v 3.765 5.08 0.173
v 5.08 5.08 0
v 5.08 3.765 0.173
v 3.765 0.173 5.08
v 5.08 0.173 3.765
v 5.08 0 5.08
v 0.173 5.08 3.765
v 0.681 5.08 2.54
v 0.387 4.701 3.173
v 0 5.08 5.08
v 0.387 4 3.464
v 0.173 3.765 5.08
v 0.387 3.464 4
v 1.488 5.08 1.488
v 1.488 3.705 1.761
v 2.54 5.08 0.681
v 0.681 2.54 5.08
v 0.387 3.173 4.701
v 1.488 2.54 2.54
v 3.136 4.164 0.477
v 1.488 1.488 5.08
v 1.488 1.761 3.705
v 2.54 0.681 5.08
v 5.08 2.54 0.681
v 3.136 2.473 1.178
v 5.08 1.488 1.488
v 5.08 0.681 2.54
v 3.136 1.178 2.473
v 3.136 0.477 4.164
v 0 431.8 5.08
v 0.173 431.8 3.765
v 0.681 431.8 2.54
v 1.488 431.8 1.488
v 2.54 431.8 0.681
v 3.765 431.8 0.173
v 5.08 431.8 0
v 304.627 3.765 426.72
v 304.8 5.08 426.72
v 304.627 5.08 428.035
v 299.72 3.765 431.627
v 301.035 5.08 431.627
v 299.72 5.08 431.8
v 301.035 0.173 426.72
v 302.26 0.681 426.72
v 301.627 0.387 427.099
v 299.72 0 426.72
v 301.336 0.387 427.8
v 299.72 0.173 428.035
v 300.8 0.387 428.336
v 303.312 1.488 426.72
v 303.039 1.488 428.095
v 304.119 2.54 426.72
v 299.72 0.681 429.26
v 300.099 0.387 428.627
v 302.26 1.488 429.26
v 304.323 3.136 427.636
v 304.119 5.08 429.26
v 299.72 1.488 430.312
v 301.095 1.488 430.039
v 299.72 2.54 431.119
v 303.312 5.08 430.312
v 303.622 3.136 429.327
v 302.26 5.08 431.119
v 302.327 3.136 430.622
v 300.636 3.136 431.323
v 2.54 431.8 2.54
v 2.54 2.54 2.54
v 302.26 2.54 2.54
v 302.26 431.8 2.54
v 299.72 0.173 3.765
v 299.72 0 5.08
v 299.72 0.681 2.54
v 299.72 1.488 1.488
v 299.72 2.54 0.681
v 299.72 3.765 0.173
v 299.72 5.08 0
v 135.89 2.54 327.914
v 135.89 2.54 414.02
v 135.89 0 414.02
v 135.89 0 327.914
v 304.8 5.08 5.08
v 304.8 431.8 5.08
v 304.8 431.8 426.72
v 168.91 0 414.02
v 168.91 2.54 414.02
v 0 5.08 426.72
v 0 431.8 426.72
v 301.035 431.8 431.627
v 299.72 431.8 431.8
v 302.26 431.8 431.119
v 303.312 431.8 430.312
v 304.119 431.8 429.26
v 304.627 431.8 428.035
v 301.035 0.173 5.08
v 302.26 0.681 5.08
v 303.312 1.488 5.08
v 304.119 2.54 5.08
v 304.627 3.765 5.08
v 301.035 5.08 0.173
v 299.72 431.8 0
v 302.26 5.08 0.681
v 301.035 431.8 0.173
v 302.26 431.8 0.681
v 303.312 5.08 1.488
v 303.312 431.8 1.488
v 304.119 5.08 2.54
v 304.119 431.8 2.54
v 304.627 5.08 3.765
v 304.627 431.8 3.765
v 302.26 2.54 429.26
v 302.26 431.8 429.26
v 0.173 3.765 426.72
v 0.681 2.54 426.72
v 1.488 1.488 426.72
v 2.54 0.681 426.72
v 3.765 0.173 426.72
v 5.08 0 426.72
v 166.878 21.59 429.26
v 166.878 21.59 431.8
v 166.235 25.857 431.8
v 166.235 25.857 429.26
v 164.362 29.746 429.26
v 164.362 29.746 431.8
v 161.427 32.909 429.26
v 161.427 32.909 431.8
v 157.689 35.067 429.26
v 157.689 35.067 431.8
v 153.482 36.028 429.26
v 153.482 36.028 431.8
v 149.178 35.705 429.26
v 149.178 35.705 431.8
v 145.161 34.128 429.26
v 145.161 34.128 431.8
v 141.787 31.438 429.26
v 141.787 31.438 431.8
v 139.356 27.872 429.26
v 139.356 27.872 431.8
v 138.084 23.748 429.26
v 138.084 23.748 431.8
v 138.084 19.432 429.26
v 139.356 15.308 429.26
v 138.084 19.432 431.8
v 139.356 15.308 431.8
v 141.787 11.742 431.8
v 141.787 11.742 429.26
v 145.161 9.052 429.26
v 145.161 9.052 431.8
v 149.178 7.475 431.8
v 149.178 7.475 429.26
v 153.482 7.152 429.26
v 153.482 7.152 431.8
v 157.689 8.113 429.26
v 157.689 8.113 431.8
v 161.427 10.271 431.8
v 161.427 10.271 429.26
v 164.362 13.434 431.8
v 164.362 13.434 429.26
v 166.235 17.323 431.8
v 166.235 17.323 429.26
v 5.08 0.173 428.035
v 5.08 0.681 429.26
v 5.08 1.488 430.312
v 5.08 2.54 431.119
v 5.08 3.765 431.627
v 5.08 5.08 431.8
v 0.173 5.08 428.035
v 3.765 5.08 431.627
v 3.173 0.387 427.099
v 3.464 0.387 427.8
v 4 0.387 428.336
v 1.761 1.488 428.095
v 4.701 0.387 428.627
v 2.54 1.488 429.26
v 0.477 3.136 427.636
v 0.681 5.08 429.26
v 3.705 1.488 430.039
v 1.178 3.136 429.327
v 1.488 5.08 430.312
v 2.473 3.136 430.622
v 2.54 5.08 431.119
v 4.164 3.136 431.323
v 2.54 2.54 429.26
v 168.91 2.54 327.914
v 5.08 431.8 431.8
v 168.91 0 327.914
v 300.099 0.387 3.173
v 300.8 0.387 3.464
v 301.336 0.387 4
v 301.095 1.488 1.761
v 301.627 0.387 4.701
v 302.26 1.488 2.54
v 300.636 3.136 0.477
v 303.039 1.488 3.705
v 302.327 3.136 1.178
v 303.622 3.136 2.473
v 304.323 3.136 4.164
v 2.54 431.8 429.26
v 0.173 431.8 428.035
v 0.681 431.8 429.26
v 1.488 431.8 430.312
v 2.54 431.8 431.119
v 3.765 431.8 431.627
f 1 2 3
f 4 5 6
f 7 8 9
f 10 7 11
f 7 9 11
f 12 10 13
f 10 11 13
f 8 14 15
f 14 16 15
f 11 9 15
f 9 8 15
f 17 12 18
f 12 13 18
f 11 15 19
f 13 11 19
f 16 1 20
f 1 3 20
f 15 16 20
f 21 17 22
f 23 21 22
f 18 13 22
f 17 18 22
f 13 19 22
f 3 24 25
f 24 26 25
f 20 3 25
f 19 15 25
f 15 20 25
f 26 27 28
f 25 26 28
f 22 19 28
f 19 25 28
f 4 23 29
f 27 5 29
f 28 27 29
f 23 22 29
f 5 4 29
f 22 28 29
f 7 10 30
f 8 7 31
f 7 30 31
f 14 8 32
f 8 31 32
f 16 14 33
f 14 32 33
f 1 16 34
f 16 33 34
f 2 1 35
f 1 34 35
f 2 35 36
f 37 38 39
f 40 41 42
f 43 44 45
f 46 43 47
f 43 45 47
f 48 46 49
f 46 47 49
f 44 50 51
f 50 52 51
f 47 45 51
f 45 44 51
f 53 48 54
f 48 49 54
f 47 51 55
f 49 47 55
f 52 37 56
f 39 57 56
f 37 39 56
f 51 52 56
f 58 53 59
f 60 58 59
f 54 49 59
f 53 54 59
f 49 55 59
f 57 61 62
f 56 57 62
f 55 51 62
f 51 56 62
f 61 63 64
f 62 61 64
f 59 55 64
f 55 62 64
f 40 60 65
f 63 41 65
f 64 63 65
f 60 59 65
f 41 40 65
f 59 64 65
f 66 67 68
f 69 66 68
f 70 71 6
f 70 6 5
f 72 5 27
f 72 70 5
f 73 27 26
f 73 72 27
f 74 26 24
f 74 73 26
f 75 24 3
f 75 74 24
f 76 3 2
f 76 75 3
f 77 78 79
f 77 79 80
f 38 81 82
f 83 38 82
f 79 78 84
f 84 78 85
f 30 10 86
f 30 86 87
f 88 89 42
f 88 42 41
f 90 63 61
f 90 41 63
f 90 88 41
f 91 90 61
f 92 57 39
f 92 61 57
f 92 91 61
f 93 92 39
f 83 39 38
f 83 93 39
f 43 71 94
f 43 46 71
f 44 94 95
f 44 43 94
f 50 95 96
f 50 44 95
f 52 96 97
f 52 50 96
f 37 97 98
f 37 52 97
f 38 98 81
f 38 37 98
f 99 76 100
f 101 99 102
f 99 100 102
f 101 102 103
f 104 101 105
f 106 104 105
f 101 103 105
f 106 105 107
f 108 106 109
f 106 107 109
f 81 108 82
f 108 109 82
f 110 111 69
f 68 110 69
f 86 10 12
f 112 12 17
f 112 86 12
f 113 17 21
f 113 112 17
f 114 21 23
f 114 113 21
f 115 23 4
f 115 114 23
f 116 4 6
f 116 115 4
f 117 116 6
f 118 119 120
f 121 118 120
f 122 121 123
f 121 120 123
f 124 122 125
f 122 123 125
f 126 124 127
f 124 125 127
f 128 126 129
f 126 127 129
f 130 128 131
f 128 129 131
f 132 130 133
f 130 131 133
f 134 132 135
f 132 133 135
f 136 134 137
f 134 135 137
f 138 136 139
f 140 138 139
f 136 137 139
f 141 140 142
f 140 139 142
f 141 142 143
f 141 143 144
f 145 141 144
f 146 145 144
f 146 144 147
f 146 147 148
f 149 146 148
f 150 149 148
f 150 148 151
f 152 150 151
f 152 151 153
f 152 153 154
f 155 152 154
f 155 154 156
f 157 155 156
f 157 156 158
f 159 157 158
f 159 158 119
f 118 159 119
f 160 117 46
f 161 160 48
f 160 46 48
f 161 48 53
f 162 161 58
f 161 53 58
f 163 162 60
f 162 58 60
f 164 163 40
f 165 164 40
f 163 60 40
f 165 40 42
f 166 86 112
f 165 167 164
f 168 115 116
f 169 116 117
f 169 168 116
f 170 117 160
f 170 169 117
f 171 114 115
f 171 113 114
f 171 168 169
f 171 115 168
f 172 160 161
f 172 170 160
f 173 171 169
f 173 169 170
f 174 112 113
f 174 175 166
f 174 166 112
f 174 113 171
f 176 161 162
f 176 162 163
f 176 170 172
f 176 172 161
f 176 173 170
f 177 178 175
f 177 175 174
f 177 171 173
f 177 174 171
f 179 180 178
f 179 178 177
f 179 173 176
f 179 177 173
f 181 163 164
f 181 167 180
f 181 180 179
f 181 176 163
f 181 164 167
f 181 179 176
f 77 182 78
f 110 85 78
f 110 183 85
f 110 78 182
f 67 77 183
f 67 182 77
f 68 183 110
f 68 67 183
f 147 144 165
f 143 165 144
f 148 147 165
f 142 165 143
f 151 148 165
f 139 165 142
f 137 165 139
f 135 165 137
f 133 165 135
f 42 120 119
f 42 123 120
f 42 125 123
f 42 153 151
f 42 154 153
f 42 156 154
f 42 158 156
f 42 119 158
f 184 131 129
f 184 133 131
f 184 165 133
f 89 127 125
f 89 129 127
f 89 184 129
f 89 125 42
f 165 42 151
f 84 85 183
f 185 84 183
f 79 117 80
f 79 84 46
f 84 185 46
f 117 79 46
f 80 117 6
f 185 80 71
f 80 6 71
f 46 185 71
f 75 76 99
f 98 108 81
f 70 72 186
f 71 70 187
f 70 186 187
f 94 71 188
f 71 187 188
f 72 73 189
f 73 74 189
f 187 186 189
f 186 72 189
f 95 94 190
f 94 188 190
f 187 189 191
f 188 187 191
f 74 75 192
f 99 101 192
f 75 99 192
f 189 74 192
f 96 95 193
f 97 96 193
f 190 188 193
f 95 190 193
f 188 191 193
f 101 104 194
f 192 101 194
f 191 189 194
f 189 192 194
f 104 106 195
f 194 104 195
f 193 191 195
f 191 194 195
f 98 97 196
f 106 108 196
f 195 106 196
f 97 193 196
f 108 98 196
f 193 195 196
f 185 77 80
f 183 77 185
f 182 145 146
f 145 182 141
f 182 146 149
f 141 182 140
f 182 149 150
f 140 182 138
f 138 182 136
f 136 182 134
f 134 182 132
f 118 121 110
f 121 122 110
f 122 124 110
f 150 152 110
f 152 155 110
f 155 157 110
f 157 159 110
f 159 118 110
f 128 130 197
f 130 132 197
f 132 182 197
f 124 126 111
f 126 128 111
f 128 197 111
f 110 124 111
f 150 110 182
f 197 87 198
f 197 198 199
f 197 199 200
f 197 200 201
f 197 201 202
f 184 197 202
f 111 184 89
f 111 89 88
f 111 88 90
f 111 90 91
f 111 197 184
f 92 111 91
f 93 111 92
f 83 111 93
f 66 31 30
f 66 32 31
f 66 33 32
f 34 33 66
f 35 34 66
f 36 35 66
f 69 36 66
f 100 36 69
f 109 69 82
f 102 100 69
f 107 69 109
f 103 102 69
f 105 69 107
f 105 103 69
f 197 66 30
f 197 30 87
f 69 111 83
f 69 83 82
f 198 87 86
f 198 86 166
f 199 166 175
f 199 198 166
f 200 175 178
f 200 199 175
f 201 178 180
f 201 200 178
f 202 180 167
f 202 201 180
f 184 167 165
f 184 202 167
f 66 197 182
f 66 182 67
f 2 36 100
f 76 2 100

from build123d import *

# Parameters (mm, degrees)
SKETCH1_W           = 304.8
SKETCH1_H           = 431.8
BOSS_EXTRUDE1_DEPTH = 431.8
SKETCH2_W           = 299.72
SKETCH2_H           = 426.72
CUT_EXTRUDE1_DEPTH  = 429.26
FILLET1_R           = 5.08
SKETCH3_W           = 33.02
SKETCH3_H           = 86.106
CUT_EXTRUDE2_DEPTH  = 3.54
SKETCH10_R          = 14.478
CUT_EXTRUDE7_DEPTH  = 7.62


with BuildPart() as part:
    # Sketch1 → Boss-Extrude1 (new body)
    with BuildSketch(Plane.XY):
        with Locations((152.4, 215.9)):
            Rectangle(SKETCH1_W, SKETCH1_H)
    extrude(amount=BOSS_EXTRUDE1_DEPTH)

    # Sketch2 → Cut-Extrude1 (cut)
    with BuildSketch(Plane(origin=(0, 431.8, 0), x_dir=(1, 0, 0), z_dir=(0, 1, 0))):
        with Locations((152.4, -215.9)):
            Rectangle(SKETCH2_W, SKETCH2_H)
    extrude(amount=-CUT_EXTRUDE1_DEPTH, mode=Mode.SUBTRACT)

    # Fillet1
    fillet1_edges = [part.edges().sort_by_distance(p)[0] for p in [
        (304.8, 215.9, 431.8),
        (0, 215.9, 431.8),
        (304.8, 215.9, 0),
        (152.4, 0, 0),
        (0, 215.9, 0),
        (304.8, 0, 215.9),
        (0, 0, 215.9),
        (152.4, 0, 431.8),
    ]]
    fillet(fillet1_edges, radius=FILLET1_R)

    # Sketch3 → Cut-Extrude2 (cut, through all)
    with BuildSketch(Plane(origin=(0, 2.54, 0), x_dir=(1, 0, 0), z_dir=(0, 1, 0))):
        with Locations((152.4, -370.967)):
            Rectangle(SKETCH3_W, SKETCH3_H)
    extrude(amount=-CUT_EXTRUDE2_DEPTH, mode=Mode.SUBTRACT)

    # Sketch10 → Cut-Extrude7 (cut)
    with BuildSketch(Plane.XY.offset(431.8)):
        with Locations((152.4, 21.59)):
            Circle(SKETCH10_R)
    extrude(amount=-CUT_EXTRUDE7_DEPTH, mode=Mode.SUBTRACT)


solid = part.part
